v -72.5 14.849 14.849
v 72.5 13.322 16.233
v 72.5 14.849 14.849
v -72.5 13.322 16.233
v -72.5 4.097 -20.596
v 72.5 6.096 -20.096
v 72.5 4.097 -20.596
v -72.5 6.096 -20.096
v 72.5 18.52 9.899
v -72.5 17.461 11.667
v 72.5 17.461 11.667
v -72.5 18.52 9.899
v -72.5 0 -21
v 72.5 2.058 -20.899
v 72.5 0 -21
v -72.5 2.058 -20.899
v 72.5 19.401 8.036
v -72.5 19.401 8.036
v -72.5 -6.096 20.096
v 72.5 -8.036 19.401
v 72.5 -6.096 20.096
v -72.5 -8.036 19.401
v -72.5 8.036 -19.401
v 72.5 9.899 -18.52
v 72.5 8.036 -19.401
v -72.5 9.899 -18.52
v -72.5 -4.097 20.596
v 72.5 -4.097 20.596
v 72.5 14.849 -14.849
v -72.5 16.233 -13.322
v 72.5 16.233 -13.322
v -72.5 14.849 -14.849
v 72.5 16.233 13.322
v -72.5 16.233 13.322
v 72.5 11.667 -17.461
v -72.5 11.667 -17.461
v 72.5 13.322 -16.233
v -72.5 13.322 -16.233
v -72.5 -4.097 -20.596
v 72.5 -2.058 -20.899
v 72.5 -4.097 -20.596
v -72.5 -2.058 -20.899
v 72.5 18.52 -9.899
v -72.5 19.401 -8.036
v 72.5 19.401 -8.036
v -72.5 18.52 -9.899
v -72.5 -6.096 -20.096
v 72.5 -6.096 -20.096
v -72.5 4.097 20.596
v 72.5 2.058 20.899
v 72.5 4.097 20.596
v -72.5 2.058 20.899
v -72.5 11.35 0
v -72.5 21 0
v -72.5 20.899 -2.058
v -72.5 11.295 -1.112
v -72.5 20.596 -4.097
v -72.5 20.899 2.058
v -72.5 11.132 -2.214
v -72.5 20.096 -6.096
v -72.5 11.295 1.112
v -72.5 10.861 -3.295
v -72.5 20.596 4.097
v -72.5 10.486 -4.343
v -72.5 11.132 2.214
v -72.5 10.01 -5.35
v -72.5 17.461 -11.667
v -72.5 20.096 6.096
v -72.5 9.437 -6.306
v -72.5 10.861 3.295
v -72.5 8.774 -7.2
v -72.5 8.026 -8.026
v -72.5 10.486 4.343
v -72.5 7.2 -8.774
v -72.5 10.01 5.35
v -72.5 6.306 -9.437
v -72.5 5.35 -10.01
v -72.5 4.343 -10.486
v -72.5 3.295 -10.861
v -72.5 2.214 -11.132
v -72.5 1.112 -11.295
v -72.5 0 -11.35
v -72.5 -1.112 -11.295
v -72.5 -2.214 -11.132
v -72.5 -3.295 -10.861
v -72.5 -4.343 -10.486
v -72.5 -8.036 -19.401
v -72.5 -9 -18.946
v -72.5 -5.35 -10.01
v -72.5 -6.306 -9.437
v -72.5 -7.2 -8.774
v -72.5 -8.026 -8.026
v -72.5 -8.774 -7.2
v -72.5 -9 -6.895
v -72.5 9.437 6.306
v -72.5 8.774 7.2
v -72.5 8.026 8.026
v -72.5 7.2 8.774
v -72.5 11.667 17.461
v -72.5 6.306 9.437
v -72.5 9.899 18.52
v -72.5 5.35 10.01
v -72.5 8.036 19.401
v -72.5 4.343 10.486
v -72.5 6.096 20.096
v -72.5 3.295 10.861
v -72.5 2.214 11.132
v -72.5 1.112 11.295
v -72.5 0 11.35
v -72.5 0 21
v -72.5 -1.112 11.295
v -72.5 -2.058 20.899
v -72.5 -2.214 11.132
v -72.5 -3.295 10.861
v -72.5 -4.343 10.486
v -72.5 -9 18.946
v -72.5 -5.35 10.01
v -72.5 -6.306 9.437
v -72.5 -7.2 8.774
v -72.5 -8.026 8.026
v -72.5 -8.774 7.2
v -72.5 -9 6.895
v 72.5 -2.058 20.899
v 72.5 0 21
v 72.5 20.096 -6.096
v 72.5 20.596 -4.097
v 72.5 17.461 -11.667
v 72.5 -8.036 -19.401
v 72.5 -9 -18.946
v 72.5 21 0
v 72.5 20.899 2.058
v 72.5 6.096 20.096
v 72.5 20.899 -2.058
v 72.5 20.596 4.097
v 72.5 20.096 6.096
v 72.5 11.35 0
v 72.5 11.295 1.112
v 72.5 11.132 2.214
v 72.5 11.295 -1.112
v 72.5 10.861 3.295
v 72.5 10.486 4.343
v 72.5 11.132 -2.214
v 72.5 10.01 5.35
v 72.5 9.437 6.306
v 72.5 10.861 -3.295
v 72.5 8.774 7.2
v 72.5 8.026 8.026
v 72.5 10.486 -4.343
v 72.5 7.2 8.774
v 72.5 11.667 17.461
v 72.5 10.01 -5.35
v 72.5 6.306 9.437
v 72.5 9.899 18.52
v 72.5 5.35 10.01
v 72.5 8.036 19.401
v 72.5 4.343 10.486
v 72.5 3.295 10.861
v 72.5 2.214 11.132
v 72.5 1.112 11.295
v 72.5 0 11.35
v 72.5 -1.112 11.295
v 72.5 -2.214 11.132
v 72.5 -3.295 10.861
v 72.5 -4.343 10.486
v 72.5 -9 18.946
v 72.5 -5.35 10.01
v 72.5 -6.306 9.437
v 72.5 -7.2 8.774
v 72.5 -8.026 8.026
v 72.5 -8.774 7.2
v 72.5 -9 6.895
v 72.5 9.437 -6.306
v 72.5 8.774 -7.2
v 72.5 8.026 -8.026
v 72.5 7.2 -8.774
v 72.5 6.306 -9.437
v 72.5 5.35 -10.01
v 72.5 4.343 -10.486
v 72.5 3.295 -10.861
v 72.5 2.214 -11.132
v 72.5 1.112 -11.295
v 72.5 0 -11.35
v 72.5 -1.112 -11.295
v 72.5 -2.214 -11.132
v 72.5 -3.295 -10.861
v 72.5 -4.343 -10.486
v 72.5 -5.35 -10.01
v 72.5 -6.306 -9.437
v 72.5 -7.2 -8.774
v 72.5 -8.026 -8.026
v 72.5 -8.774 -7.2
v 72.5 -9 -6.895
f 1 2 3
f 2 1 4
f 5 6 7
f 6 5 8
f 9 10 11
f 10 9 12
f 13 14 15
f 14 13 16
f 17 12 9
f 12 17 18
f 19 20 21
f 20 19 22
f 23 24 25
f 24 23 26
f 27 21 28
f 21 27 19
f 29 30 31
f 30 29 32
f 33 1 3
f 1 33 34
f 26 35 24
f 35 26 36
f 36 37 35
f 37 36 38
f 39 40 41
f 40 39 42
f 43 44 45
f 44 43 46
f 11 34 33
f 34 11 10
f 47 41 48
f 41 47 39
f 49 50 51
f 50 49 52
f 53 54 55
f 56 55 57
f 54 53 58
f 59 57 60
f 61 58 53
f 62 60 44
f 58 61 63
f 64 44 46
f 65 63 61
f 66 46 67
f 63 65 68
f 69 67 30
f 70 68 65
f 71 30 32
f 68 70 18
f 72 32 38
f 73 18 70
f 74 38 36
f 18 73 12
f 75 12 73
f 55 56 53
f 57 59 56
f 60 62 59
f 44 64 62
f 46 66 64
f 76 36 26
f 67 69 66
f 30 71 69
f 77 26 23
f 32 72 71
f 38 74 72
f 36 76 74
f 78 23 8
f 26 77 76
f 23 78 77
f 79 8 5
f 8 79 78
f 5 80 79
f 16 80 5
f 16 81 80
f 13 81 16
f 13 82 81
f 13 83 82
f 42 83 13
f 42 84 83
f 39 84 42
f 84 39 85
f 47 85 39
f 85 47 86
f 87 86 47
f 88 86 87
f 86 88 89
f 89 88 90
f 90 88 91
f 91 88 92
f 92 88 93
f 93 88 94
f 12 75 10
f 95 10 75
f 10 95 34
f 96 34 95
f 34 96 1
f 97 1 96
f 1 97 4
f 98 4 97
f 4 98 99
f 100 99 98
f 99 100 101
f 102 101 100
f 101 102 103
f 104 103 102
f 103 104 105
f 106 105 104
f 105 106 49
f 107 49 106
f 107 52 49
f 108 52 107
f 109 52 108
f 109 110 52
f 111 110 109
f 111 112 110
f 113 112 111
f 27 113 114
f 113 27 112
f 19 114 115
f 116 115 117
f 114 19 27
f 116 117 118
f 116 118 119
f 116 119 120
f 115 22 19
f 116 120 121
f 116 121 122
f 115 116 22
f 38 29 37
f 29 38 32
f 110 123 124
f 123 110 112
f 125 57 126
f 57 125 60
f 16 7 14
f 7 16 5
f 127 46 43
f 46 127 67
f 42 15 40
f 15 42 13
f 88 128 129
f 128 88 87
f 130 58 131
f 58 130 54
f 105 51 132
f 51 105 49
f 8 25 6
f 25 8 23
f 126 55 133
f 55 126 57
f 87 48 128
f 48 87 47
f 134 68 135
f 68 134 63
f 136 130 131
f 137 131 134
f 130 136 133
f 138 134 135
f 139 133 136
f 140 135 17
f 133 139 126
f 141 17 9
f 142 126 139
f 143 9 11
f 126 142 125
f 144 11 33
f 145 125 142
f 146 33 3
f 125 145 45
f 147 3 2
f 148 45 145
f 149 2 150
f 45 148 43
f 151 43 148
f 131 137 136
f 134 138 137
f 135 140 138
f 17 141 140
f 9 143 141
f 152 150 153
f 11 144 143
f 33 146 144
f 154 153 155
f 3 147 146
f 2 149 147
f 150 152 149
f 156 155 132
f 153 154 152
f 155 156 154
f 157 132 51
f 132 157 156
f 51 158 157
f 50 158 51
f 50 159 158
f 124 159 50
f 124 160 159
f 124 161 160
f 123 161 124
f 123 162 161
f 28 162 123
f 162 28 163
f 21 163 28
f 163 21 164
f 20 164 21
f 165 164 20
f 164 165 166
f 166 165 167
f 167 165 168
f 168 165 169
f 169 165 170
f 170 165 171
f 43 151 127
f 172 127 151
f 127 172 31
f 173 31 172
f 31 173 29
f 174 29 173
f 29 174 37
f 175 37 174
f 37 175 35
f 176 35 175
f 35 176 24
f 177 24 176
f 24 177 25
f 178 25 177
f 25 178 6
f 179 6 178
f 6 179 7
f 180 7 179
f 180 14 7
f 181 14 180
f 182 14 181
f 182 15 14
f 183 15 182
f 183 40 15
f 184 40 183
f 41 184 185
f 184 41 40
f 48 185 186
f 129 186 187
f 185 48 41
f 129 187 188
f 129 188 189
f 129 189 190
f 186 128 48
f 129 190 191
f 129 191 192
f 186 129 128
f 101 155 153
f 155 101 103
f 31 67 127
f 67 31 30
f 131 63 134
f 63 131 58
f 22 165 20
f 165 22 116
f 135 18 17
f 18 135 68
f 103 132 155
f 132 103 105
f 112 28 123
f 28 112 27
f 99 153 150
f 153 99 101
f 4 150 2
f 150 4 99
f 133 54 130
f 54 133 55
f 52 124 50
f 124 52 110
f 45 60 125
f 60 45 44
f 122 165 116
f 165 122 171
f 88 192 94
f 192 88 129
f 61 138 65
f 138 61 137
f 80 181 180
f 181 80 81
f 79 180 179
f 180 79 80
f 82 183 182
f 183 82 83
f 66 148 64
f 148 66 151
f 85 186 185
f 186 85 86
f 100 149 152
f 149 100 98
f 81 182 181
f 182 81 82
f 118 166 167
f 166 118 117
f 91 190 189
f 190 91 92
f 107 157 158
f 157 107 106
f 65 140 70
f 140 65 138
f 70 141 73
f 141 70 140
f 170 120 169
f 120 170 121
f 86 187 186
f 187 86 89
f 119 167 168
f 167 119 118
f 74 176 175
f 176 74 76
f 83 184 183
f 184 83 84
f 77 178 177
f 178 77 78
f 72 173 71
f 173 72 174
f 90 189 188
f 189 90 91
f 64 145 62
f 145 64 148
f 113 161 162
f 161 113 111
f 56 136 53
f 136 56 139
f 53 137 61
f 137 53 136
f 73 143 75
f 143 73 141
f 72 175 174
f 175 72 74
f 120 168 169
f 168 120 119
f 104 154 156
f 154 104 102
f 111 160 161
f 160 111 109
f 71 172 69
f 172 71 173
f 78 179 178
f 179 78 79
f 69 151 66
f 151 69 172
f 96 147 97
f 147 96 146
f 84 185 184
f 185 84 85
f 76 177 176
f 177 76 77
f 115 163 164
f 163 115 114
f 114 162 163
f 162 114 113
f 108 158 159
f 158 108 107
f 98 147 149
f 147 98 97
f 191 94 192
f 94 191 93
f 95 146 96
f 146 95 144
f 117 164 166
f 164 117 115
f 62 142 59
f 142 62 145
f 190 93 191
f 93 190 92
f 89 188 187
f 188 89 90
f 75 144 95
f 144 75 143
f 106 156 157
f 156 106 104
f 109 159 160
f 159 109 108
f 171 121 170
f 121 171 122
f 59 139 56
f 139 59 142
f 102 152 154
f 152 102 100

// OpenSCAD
$fn=64;len=145;od=42;id=22.7;
difference(){intersection(){rotate([0,90,0])cylinder(h=len,d=od,center=true);translate([0,12,0])cube([len+4,od,od+4],center=true);}rotate([0,90,0])cylinder(h=len+4,d=id,center=true);}
